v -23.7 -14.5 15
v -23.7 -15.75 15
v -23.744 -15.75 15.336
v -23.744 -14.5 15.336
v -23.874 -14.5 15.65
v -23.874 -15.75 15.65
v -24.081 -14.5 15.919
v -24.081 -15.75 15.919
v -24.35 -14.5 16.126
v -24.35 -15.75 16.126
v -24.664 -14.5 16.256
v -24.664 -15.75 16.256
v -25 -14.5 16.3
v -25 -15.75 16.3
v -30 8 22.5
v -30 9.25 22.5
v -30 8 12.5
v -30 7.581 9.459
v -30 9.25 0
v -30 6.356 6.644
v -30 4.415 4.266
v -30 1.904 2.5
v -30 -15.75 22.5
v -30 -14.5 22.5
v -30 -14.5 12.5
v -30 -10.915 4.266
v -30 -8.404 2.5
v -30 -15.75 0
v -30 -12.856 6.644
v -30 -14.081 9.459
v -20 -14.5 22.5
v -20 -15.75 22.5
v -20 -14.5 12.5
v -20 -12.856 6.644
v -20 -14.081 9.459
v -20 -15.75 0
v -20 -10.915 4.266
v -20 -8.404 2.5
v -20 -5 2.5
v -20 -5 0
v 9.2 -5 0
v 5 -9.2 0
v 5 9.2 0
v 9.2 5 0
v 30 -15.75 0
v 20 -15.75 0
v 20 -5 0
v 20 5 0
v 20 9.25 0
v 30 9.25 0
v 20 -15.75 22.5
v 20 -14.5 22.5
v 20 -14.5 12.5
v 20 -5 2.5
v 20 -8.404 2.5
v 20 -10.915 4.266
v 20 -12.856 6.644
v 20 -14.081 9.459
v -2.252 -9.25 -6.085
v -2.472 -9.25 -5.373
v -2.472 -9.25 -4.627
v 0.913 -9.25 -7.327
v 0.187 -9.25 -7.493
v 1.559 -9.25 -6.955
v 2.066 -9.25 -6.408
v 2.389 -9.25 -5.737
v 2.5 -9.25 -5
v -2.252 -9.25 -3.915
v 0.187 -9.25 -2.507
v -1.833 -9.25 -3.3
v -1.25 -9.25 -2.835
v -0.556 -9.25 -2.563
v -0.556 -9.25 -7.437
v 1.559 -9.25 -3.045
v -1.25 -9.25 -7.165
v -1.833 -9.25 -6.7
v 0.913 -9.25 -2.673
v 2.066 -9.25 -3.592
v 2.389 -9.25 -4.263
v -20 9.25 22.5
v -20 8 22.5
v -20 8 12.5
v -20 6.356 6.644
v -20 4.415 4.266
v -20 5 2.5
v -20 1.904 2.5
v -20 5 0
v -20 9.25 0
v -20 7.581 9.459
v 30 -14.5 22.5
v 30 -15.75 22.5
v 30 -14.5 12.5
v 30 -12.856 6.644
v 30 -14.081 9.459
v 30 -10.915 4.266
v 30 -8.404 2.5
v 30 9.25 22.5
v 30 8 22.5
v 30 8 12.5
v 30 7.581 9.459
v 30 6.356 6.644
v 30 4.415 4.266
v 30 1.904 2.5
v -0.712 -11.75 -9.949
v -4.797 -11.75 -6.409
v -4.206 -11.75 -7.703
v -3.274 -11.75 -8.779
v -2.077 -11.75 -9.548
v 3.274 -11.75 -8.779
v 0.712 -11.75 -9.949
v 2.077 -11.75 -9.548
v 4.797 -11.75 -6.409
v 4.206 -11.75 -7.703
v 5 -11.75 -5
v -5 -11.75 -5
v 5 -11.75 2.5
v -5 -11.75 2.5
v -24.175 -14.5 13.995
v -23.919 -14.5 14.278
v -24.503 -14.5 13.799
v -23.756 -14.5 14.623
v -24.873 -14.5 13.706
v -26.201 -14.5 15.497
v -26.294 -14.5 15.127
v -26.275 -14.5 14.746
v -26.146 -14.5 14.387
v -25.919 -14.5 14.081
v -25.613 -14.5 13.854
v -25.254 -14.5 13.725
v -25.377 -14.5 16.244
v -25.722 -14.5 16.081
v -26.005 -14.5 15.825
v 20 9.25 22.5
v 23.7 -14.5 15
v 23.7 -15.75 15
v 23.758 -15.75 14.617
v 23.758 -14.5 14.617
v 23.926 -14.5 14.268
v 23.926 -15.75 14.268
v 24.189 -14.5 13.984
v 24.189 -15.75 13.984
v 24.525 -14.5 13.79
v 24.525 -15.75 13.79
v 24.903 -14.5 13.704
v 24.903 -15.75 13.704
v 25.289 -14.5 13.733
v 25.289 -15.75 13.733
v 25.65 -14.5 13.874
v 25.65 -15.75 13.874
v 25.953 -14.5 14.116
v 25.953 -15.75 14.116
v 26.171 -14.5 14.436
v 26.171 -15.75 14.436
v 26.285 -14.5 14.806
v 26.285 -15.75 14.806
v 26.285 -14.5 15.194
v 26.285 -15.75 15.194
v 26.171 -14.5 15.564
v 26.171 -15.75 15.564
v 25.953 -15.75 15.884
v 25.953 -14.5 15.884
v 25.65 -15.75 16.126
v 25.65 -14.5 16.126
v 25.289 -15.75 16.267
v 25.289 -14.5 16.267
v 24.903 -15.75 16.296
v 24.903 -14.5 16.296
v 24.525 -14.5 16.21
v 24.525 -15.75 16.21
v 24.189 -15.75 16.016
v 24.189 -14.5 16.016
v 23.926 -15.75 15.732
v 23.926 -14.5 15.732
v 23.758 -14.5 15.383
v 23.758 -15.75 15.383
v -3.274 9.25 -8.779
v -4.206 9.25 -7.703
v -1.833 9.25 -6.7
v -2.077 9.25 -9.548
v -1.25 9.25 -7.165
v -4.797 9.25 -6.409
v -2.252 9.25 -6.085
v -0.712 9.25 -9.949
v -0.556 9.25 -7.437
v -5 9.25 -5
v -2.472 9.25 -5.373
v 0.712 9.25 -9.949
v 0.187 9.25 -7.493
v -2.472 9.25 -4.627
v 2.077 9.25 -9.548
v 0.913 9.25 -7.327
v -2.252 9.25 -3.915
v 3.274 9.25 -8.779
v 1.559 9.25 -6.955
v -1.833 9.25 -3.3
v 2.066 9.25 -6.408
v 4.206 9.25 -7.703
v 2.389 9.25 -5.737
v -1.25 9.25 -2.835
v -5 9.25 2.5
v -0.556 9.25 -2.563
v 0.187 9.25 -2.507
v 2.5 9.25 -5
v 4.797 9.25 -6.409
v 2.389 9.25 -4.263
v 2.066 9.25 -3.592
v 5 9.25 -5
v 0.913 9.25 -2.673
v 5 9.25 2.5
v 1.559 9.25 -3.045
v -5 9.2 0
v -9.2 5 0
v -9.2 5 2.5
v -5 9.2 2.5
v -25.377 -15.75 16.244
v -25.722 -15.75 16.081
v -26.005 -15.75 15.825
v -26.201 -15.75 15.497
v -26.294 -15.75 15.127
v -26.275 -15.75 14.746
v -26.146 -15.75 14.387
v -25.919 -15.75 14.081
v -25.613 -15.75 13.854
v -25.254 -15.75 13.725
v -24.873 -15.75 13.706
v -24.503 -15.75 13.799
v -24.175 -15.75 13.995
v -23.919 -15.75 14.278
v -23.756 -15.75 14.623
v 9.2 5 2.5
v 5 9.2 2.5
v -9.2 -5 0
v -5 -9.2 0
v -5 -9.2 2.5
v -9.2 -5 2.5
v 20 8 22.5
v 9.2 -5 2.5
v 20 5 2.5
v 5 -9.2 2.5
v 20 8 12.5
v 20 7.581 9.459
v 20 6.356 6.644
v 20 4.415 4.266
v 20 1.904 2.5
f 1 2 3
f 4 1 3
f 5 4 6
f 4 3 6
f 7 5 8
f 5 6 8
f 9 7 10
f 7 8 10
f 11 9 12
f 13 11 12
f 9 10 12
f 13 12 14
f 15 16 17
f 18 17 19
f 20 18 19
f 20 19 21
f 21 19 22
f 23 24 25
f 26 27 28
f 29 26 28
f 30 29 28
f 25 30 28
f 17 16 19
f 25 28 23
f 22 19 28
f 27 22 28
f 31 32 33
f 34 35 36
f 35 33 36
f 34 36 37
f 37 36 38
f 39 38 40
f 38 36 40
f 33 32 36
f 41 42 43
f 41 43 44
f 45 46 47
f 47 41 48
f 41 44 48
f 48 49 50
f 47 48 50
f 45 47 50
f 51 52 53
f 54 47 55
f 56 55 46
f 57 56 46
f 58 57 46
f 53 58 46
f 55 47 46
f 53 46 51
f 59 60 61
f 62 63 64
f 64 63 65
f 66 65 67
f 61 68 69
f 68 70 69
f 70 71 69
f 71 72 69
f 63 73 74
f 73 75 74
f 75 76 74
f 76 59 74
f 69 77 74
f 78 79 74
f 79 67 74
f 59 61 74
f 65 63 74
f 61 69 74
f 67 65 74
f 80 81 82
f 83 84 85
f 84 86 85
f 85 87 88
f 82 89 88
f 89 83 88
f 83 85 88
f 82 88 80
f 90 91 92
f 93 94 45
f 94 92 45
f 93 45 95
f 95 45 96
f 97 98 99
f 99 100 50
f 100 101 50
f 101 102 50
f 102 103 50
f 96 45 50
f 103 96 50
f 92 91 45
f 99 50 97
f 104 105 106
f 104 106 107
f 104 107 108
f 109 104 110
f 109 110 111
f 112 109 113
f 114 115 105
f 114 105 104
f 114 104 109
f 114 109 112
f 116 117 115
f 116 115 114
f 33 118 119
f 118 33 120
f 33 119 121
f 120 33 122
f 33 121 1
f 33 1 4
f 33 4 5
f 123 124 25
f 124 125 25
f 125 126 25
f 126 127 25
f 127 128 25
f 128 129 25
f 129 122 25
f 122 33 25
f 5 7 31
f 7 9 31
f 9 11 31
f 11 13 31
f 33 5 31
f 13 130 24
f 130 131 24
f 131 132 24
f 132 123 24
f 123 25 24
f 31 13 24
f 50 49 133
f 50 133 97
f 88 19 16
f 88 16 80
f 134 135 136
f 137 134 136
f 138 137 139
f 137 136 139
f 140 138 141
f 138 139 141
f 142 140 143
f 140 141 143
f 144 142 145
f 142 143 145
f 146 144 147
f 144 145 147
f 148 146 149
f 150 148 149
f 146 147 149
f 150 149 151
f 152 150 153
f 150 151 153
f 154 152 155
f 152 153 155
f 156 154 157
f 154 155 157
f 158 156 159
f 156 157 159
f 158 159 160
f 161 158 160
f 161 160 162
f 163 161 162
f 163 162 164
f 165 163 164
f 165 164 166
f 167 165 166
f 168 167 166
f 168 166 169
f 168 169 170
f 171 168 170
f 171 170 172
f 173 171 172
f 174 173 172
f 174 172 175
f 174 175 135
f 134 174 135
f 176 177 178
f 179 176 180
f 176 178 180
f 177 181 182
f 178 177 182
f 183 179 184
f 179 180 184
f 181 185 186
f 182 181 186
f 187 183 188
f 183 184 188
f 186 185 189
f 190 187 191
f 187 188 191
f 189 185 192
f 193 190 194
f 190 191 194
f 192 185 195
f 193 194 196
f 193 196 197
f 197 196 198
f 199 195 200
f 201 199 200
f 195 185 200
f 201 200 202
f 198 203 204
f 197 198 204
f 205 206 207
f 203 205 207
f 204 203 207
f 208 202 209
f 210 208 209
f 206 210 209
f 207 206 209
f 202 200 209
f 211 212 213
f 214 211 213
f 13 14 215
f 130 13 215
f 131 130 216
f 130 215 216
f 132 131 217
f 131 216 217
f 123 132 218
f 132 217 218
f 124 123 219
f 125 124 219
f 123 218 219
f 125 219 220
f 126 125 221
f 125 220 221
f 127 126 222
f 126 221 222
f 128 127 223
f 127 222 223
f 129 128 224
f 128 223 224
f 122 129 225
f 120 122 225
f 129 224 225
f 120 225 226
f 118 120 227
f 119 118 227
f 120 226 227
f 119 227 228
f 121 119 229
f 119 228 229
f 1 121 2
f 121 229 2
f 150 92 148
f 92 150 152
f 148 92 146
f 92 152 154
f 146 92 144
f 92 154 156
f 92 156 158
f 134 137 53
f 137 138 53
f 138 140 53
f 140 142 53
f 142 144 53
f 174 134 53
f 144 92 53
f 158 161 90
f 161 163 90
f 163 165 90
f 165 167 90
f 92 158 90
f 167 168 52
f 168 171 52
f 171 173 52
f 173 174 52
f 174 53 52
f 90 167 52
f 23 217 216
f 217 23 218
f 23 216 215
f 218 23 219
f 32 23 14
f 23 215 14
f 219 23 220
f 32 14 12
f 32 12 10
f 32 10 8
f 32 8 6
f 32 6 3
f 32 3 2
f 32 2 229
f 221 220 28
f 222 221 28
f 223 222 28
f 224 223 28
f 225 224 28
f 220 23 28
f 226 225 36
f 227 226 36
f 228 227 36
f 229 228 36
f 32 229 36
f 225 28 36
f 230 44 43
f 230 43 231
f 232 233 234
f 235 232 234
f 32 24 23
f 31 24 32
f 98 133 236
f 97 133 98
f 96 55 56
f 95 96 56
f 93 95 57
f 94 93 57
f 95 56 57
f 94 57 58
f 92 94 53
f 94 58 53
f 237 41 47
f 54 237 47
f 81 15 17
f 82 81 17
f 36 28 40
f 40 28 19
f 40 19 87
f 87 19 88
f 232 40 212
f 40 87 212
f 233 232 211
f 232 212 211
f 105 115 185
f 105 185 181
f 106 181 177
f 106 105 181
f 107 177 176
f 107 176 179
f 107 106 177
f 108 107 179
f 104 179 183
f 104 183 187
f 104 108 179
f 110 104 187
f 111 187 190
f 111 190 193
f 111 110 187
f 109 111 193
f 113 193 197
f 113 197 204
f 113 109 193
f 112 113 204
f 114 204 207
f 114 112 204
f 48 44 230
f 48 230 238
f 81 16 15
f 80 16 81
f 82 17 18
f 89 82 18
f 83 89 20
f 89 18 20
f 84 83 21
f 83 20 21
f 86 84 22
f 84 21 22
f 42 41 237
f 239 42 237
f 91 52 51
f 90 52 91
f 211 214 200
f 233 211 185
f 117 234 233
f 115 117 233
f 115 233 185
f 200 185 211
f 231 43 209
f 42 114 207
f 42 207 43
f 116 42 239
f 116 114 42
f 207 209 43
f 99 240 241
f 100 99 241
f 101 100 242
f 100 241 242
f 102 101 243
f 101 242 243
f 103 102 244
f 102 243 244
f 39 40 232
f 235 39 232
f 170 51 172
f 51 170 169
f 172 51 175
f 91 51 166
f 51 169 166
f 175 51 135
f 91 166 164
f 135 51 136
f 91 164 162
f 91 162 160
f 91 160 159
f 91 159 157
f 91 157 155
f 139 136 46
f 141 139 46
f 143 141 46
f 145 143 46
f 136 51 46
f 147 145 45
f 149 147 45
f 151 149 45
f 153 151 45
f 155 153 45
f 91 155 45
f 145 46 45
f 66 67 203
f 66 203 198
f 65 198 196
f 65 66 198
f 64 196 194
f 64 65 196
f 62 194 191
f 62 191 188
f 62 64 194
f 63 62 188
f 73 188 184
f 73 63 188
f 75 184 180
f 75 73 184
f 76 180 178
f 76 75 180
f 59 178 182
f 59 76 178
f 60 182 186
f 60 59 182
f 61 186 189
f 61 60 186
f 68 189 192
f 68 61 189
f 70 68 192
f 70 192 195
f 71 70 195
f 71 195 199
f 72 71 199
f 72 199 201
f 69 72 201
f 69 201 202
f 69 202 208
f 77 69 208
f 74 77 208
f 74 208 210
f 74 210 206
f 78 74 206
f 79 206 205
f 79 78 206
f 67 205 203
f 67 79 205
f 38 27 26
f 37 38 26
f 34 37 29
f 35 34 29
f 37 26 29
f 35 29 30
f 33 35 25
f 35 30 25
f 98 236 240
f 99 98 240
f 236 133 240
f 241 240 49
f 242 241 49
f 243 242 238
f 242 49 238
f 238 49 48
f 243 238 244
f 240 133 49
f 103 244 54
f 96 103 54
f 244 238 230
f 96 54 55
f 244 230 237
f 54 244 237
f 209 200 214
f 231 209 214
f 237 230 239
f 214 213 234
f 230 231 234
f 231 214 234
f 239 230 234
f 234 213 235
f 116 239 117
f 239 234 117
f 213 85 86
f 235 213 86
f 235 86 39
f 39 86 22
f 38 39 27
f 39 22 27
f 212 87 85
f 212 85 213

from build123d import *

# Parameters (mm, degrees)
F0_W      = 25
F0_H      = 10
F0_W_2    = 10
F0_H_2    = 4.25
F1_DEPTH  = 2.5
F3_DEPTH  = 2.5
F4_DEPTH  = 18.5
F5_SIZE   = 4.2
F6_W      = 10
F6_H      = 4.25
F6_H_2    = 10
F6_H_3    = 10.75
F7_DEPTH  = 2.5
F8_DEPTH  = 20
F10_DEPTH = 60
F12_DEPTH = 10


with BuildPart() as f1:
    # F0 (on Top) → F1 (new body)
    with BuildSketch(Plane.XY):
        with Locations((-17.5, 0)):
            Rectangle(F0_W, F0_H)
        with Locations((0, 7.125)):
            Rectangle(F0_W_2, F0_H_2)
        Rectangle(F0_W_2, F0_H)
        with Locations((0, -7.125)):
            Rectangle(F0_W_2, F0_H_2)
        with Locations((17.5, 0)):
            Rectangle(F0_W, F0_H)
    extrude(amount=F1_DEPTH)

    # F2 (on face) → F3 (join)
    with BuildSketch(Plane.XZ.offset(9.25)):
        with BuildLine():
            Line((0, 0), (-5, 0))
            Line((-5, 0), (-5, -5))
            ThreePointArc((-5, -5), (-3.5355339059, -1.4644660941), (0, 0))
        make_face()
        with BuildLine():
            Line((5, 0), (0, 0))
            ThreePointArc((0, 0), (3.5355339059, -1.4644660941), (5, -5))
            Line((5, -5), (5, 0))
        make_face()
        with BuildLine():
            ThreePointArc((5, -5), (3.5355339059, -1.4644660941), (0, 0))
            ThreePointArc((0, 0), (-3.5355339059, -1.4644660941), (-5, -5))
            Line((-5, -5), (-2.5, -5))
            ThreePointArc((-2.5, -5), (0, -2.5), (2.5, -5))
            Line((2.5, -5), (5, -5))
        make_face()
        with BuildLine():
            Line((-2.5, -5), (-5, -5))
            ThreePointArc((-5, -5), (0, -10), (5, -5))
            Line((5, -5), (2.5, -5))
            ThreePointArc((2.5, -5), (0, -7.5), (-2.5, -5))
        make_face()
        with BuildLine():
            Line((2.5, -5), (-2.5, -5))
            ThreePointArc((-2.5, -5), (0, -7.5), (2.5, -5))
        make_face()
        with BuildLine():
            ThreePointArc((2.5, -5), (0, -2.5), (-2.5, -5))
            Line((-2.5, -5), (2.5, -5))
        make_face()
        Polygon((-5, 2.5), (-5, 0), (0, 0), (5, 0), (5, 2.5), align=None)
    extrude(amount=F3_DEPTH)

    # F2 (on face) → F4 (join)
    with BuildSketch(Plane.XZ.offset(9.25)):
        with BuildLine():
            ThreePointArc((5, -5), (3.5355339059, -1.4644660941), (0, 0))
            ThreePointArc((0, 0), (-3.5355339059, -1.4644660941), (-5, -5))
            Line((-5, -5), (-2.5, -5))
            ThreePointArc((-2.5, -5), (0, -2.5), (2.5, -5))
            Line((2.5, -5), (5, -5))
        make_face()
        with BuildLine():
            Line((-2.5, -5), (-5, -5))
            ThreePointArc((-5, -5), (0, -10), (5, -5))
            Line((5, -5), (2.5, -5))
            ThreePointArc((2.5, -5), (0, -7.5), (-2.5, -5))
        make_face()
        with BuildLine():
            Line((0, 0), (-5, 0))
            Line((-5, 0), (-5, -5))
            ThreePointArc((-5, -5), (-3.5355339059, -1.4644660941), (0, 0))
        make_face()
        with BuildLine():
            Line((5, 0), (0, 0))
            ThreePointArc((0, 0), (3.5355339059, -1.4644660941), (5, -5))
            Line((5, -5), (5, 0))
        make_face()
    extrude(amount=-F4_DEPTH)

    # F5
    f5_edges = [f1.edges().sort_by_distance(p)[0] for p in [
        (-5, 5, 1.25),
        (-5, -5, 1.25),
        (5, 5, 1.25),
        (5, -5, 1.25),
    ]]
    chamfer(f5_edges, length=F5_SIZE)

    # F6 (on face) → F7 (join)
    with BuildSketch(Plane.XY.offset(2.5)):
        with Locations((-25, 7.125)):
            Rectangle(F6_W, F6_H)
        with Locations((-25, 0)):
            Rectangle(F6_W, F6_H_2)
        with Locations((-25, -10.375)):
            Rectangle(F6_W, F6_H_3)
        with Locations((25, 7.125)):
            Rectangle(F6_W, F6_H)
        with Locations((25, 0)):
            Rectangle(F6_W, F6_H_2)
        with Locations((25, -10.375)):
            Rectangle(F6_W, F6_H_3)
    extrude(amount=-F7_DEPTH)

    # F6 (on face) → F8 (join)
    with BuildSketch(Plane.XY.offset(2.5)):
        with Locations((-25, 7.125)):
            Rectangle(F6_W, F6_H)
        with Locations((-25, 0)):
            Rectangle(F6_W, F6_H_2)
        with Locations((-25, -10.375)):
            Rectangle(F6_W, F6_H_3)
        with Locations((25, -10.375)):
            Rectangle(F6_W, F6_H_3)
        with Locations((25, 0)):
            Rectangle(F6_W, F6_H_2)
        with Locations((25, 7.125)):
            Rectangle(F6_W, F6_H)
    extrude(amount=F8_DEPTH)

    # F9 (on face) → F10 (cut)
    with BuildSketch(Plane(origin=(-30, 0, 0), x_dir=(0, -1, 0), z_dir=(-1, 0, 0))):
        with BuildLine():
            ThreePointArc((8.403882032, 2.5), (12.855823048, 6.644176952), (14.5, 12.5))
            ThreePointArc((14.5, 12.5), (12.855823048, 18.355823048), (8.403882032, 22.5))
            Line((8.403882032, 22.5), (3.25, 22.5))
            Line((3.25, 22.5), (-1.903882032, 22.5))
            ThreePointArc((-1.903882032, 22.5), (-6.355823048, 18.355823048), (-8, 12.5))
            ThreePointArc((-8, 12.5), (-6.355823048, 6.644176952), (-1.903882032, 2.5))
            Line((-1.903882032, 2.5), (8.403882032, 2.5))
        make_face()
        with BuildLine():
            ThreePointArc((8.403882032, 22.5), (12.855823048, 18.355823048), (14.5, 12.5))
            Line((14.5, 12.5), (14.5, 22.5))
            Line((14.5, 22.5), (8.403882032, 22.5))
        make_face()
        with BuildLine():
            ThreePointArc((-8, 12.5), (-6.355823048, 18.355823048), (-1.903882032, 22.5))
            Line((-1.903882032, 22.5), (-8, 22.5))
            Line((-8, 22.5), (-8, 12.5))
        make_face()
    extrude(amount=-F10_DEPTH, mode=Mode.SUBTRACT)

    # F11 (on face) → F12 (cut)
    with BuildSketch(Plane.XZ.offset(15.75)):
        with BuildLine():
            Line((-25, 15), (-25, 16.3))
            ThreePointArc((-25, 16.3), (-25.9192388155, 14.0807611845), (-23.7, 15))
            Line((-23.7, 15), (-25, 15))
        make_face()
        with BuildLine():
            ThreePointArc((-23.7, 15), (-24.0807611845, 15.9192388155), (-25, 16.3))
            Line((-25, 16.3), (-25, 15))
            Line((-25, 15), (-23.7, 15))
        make_face()
        with BuildLine():
            ThreePointArc((26.3, 15), (25, 16.3), (23.7, 15))
            ThreePointArc((23.7, 15), (25, 13.7), (26.3, 15))
        make_face()
    extrude(amount=-F12_DEPTH, mode=Mode.SUBTRACT)


solid = f1.part
